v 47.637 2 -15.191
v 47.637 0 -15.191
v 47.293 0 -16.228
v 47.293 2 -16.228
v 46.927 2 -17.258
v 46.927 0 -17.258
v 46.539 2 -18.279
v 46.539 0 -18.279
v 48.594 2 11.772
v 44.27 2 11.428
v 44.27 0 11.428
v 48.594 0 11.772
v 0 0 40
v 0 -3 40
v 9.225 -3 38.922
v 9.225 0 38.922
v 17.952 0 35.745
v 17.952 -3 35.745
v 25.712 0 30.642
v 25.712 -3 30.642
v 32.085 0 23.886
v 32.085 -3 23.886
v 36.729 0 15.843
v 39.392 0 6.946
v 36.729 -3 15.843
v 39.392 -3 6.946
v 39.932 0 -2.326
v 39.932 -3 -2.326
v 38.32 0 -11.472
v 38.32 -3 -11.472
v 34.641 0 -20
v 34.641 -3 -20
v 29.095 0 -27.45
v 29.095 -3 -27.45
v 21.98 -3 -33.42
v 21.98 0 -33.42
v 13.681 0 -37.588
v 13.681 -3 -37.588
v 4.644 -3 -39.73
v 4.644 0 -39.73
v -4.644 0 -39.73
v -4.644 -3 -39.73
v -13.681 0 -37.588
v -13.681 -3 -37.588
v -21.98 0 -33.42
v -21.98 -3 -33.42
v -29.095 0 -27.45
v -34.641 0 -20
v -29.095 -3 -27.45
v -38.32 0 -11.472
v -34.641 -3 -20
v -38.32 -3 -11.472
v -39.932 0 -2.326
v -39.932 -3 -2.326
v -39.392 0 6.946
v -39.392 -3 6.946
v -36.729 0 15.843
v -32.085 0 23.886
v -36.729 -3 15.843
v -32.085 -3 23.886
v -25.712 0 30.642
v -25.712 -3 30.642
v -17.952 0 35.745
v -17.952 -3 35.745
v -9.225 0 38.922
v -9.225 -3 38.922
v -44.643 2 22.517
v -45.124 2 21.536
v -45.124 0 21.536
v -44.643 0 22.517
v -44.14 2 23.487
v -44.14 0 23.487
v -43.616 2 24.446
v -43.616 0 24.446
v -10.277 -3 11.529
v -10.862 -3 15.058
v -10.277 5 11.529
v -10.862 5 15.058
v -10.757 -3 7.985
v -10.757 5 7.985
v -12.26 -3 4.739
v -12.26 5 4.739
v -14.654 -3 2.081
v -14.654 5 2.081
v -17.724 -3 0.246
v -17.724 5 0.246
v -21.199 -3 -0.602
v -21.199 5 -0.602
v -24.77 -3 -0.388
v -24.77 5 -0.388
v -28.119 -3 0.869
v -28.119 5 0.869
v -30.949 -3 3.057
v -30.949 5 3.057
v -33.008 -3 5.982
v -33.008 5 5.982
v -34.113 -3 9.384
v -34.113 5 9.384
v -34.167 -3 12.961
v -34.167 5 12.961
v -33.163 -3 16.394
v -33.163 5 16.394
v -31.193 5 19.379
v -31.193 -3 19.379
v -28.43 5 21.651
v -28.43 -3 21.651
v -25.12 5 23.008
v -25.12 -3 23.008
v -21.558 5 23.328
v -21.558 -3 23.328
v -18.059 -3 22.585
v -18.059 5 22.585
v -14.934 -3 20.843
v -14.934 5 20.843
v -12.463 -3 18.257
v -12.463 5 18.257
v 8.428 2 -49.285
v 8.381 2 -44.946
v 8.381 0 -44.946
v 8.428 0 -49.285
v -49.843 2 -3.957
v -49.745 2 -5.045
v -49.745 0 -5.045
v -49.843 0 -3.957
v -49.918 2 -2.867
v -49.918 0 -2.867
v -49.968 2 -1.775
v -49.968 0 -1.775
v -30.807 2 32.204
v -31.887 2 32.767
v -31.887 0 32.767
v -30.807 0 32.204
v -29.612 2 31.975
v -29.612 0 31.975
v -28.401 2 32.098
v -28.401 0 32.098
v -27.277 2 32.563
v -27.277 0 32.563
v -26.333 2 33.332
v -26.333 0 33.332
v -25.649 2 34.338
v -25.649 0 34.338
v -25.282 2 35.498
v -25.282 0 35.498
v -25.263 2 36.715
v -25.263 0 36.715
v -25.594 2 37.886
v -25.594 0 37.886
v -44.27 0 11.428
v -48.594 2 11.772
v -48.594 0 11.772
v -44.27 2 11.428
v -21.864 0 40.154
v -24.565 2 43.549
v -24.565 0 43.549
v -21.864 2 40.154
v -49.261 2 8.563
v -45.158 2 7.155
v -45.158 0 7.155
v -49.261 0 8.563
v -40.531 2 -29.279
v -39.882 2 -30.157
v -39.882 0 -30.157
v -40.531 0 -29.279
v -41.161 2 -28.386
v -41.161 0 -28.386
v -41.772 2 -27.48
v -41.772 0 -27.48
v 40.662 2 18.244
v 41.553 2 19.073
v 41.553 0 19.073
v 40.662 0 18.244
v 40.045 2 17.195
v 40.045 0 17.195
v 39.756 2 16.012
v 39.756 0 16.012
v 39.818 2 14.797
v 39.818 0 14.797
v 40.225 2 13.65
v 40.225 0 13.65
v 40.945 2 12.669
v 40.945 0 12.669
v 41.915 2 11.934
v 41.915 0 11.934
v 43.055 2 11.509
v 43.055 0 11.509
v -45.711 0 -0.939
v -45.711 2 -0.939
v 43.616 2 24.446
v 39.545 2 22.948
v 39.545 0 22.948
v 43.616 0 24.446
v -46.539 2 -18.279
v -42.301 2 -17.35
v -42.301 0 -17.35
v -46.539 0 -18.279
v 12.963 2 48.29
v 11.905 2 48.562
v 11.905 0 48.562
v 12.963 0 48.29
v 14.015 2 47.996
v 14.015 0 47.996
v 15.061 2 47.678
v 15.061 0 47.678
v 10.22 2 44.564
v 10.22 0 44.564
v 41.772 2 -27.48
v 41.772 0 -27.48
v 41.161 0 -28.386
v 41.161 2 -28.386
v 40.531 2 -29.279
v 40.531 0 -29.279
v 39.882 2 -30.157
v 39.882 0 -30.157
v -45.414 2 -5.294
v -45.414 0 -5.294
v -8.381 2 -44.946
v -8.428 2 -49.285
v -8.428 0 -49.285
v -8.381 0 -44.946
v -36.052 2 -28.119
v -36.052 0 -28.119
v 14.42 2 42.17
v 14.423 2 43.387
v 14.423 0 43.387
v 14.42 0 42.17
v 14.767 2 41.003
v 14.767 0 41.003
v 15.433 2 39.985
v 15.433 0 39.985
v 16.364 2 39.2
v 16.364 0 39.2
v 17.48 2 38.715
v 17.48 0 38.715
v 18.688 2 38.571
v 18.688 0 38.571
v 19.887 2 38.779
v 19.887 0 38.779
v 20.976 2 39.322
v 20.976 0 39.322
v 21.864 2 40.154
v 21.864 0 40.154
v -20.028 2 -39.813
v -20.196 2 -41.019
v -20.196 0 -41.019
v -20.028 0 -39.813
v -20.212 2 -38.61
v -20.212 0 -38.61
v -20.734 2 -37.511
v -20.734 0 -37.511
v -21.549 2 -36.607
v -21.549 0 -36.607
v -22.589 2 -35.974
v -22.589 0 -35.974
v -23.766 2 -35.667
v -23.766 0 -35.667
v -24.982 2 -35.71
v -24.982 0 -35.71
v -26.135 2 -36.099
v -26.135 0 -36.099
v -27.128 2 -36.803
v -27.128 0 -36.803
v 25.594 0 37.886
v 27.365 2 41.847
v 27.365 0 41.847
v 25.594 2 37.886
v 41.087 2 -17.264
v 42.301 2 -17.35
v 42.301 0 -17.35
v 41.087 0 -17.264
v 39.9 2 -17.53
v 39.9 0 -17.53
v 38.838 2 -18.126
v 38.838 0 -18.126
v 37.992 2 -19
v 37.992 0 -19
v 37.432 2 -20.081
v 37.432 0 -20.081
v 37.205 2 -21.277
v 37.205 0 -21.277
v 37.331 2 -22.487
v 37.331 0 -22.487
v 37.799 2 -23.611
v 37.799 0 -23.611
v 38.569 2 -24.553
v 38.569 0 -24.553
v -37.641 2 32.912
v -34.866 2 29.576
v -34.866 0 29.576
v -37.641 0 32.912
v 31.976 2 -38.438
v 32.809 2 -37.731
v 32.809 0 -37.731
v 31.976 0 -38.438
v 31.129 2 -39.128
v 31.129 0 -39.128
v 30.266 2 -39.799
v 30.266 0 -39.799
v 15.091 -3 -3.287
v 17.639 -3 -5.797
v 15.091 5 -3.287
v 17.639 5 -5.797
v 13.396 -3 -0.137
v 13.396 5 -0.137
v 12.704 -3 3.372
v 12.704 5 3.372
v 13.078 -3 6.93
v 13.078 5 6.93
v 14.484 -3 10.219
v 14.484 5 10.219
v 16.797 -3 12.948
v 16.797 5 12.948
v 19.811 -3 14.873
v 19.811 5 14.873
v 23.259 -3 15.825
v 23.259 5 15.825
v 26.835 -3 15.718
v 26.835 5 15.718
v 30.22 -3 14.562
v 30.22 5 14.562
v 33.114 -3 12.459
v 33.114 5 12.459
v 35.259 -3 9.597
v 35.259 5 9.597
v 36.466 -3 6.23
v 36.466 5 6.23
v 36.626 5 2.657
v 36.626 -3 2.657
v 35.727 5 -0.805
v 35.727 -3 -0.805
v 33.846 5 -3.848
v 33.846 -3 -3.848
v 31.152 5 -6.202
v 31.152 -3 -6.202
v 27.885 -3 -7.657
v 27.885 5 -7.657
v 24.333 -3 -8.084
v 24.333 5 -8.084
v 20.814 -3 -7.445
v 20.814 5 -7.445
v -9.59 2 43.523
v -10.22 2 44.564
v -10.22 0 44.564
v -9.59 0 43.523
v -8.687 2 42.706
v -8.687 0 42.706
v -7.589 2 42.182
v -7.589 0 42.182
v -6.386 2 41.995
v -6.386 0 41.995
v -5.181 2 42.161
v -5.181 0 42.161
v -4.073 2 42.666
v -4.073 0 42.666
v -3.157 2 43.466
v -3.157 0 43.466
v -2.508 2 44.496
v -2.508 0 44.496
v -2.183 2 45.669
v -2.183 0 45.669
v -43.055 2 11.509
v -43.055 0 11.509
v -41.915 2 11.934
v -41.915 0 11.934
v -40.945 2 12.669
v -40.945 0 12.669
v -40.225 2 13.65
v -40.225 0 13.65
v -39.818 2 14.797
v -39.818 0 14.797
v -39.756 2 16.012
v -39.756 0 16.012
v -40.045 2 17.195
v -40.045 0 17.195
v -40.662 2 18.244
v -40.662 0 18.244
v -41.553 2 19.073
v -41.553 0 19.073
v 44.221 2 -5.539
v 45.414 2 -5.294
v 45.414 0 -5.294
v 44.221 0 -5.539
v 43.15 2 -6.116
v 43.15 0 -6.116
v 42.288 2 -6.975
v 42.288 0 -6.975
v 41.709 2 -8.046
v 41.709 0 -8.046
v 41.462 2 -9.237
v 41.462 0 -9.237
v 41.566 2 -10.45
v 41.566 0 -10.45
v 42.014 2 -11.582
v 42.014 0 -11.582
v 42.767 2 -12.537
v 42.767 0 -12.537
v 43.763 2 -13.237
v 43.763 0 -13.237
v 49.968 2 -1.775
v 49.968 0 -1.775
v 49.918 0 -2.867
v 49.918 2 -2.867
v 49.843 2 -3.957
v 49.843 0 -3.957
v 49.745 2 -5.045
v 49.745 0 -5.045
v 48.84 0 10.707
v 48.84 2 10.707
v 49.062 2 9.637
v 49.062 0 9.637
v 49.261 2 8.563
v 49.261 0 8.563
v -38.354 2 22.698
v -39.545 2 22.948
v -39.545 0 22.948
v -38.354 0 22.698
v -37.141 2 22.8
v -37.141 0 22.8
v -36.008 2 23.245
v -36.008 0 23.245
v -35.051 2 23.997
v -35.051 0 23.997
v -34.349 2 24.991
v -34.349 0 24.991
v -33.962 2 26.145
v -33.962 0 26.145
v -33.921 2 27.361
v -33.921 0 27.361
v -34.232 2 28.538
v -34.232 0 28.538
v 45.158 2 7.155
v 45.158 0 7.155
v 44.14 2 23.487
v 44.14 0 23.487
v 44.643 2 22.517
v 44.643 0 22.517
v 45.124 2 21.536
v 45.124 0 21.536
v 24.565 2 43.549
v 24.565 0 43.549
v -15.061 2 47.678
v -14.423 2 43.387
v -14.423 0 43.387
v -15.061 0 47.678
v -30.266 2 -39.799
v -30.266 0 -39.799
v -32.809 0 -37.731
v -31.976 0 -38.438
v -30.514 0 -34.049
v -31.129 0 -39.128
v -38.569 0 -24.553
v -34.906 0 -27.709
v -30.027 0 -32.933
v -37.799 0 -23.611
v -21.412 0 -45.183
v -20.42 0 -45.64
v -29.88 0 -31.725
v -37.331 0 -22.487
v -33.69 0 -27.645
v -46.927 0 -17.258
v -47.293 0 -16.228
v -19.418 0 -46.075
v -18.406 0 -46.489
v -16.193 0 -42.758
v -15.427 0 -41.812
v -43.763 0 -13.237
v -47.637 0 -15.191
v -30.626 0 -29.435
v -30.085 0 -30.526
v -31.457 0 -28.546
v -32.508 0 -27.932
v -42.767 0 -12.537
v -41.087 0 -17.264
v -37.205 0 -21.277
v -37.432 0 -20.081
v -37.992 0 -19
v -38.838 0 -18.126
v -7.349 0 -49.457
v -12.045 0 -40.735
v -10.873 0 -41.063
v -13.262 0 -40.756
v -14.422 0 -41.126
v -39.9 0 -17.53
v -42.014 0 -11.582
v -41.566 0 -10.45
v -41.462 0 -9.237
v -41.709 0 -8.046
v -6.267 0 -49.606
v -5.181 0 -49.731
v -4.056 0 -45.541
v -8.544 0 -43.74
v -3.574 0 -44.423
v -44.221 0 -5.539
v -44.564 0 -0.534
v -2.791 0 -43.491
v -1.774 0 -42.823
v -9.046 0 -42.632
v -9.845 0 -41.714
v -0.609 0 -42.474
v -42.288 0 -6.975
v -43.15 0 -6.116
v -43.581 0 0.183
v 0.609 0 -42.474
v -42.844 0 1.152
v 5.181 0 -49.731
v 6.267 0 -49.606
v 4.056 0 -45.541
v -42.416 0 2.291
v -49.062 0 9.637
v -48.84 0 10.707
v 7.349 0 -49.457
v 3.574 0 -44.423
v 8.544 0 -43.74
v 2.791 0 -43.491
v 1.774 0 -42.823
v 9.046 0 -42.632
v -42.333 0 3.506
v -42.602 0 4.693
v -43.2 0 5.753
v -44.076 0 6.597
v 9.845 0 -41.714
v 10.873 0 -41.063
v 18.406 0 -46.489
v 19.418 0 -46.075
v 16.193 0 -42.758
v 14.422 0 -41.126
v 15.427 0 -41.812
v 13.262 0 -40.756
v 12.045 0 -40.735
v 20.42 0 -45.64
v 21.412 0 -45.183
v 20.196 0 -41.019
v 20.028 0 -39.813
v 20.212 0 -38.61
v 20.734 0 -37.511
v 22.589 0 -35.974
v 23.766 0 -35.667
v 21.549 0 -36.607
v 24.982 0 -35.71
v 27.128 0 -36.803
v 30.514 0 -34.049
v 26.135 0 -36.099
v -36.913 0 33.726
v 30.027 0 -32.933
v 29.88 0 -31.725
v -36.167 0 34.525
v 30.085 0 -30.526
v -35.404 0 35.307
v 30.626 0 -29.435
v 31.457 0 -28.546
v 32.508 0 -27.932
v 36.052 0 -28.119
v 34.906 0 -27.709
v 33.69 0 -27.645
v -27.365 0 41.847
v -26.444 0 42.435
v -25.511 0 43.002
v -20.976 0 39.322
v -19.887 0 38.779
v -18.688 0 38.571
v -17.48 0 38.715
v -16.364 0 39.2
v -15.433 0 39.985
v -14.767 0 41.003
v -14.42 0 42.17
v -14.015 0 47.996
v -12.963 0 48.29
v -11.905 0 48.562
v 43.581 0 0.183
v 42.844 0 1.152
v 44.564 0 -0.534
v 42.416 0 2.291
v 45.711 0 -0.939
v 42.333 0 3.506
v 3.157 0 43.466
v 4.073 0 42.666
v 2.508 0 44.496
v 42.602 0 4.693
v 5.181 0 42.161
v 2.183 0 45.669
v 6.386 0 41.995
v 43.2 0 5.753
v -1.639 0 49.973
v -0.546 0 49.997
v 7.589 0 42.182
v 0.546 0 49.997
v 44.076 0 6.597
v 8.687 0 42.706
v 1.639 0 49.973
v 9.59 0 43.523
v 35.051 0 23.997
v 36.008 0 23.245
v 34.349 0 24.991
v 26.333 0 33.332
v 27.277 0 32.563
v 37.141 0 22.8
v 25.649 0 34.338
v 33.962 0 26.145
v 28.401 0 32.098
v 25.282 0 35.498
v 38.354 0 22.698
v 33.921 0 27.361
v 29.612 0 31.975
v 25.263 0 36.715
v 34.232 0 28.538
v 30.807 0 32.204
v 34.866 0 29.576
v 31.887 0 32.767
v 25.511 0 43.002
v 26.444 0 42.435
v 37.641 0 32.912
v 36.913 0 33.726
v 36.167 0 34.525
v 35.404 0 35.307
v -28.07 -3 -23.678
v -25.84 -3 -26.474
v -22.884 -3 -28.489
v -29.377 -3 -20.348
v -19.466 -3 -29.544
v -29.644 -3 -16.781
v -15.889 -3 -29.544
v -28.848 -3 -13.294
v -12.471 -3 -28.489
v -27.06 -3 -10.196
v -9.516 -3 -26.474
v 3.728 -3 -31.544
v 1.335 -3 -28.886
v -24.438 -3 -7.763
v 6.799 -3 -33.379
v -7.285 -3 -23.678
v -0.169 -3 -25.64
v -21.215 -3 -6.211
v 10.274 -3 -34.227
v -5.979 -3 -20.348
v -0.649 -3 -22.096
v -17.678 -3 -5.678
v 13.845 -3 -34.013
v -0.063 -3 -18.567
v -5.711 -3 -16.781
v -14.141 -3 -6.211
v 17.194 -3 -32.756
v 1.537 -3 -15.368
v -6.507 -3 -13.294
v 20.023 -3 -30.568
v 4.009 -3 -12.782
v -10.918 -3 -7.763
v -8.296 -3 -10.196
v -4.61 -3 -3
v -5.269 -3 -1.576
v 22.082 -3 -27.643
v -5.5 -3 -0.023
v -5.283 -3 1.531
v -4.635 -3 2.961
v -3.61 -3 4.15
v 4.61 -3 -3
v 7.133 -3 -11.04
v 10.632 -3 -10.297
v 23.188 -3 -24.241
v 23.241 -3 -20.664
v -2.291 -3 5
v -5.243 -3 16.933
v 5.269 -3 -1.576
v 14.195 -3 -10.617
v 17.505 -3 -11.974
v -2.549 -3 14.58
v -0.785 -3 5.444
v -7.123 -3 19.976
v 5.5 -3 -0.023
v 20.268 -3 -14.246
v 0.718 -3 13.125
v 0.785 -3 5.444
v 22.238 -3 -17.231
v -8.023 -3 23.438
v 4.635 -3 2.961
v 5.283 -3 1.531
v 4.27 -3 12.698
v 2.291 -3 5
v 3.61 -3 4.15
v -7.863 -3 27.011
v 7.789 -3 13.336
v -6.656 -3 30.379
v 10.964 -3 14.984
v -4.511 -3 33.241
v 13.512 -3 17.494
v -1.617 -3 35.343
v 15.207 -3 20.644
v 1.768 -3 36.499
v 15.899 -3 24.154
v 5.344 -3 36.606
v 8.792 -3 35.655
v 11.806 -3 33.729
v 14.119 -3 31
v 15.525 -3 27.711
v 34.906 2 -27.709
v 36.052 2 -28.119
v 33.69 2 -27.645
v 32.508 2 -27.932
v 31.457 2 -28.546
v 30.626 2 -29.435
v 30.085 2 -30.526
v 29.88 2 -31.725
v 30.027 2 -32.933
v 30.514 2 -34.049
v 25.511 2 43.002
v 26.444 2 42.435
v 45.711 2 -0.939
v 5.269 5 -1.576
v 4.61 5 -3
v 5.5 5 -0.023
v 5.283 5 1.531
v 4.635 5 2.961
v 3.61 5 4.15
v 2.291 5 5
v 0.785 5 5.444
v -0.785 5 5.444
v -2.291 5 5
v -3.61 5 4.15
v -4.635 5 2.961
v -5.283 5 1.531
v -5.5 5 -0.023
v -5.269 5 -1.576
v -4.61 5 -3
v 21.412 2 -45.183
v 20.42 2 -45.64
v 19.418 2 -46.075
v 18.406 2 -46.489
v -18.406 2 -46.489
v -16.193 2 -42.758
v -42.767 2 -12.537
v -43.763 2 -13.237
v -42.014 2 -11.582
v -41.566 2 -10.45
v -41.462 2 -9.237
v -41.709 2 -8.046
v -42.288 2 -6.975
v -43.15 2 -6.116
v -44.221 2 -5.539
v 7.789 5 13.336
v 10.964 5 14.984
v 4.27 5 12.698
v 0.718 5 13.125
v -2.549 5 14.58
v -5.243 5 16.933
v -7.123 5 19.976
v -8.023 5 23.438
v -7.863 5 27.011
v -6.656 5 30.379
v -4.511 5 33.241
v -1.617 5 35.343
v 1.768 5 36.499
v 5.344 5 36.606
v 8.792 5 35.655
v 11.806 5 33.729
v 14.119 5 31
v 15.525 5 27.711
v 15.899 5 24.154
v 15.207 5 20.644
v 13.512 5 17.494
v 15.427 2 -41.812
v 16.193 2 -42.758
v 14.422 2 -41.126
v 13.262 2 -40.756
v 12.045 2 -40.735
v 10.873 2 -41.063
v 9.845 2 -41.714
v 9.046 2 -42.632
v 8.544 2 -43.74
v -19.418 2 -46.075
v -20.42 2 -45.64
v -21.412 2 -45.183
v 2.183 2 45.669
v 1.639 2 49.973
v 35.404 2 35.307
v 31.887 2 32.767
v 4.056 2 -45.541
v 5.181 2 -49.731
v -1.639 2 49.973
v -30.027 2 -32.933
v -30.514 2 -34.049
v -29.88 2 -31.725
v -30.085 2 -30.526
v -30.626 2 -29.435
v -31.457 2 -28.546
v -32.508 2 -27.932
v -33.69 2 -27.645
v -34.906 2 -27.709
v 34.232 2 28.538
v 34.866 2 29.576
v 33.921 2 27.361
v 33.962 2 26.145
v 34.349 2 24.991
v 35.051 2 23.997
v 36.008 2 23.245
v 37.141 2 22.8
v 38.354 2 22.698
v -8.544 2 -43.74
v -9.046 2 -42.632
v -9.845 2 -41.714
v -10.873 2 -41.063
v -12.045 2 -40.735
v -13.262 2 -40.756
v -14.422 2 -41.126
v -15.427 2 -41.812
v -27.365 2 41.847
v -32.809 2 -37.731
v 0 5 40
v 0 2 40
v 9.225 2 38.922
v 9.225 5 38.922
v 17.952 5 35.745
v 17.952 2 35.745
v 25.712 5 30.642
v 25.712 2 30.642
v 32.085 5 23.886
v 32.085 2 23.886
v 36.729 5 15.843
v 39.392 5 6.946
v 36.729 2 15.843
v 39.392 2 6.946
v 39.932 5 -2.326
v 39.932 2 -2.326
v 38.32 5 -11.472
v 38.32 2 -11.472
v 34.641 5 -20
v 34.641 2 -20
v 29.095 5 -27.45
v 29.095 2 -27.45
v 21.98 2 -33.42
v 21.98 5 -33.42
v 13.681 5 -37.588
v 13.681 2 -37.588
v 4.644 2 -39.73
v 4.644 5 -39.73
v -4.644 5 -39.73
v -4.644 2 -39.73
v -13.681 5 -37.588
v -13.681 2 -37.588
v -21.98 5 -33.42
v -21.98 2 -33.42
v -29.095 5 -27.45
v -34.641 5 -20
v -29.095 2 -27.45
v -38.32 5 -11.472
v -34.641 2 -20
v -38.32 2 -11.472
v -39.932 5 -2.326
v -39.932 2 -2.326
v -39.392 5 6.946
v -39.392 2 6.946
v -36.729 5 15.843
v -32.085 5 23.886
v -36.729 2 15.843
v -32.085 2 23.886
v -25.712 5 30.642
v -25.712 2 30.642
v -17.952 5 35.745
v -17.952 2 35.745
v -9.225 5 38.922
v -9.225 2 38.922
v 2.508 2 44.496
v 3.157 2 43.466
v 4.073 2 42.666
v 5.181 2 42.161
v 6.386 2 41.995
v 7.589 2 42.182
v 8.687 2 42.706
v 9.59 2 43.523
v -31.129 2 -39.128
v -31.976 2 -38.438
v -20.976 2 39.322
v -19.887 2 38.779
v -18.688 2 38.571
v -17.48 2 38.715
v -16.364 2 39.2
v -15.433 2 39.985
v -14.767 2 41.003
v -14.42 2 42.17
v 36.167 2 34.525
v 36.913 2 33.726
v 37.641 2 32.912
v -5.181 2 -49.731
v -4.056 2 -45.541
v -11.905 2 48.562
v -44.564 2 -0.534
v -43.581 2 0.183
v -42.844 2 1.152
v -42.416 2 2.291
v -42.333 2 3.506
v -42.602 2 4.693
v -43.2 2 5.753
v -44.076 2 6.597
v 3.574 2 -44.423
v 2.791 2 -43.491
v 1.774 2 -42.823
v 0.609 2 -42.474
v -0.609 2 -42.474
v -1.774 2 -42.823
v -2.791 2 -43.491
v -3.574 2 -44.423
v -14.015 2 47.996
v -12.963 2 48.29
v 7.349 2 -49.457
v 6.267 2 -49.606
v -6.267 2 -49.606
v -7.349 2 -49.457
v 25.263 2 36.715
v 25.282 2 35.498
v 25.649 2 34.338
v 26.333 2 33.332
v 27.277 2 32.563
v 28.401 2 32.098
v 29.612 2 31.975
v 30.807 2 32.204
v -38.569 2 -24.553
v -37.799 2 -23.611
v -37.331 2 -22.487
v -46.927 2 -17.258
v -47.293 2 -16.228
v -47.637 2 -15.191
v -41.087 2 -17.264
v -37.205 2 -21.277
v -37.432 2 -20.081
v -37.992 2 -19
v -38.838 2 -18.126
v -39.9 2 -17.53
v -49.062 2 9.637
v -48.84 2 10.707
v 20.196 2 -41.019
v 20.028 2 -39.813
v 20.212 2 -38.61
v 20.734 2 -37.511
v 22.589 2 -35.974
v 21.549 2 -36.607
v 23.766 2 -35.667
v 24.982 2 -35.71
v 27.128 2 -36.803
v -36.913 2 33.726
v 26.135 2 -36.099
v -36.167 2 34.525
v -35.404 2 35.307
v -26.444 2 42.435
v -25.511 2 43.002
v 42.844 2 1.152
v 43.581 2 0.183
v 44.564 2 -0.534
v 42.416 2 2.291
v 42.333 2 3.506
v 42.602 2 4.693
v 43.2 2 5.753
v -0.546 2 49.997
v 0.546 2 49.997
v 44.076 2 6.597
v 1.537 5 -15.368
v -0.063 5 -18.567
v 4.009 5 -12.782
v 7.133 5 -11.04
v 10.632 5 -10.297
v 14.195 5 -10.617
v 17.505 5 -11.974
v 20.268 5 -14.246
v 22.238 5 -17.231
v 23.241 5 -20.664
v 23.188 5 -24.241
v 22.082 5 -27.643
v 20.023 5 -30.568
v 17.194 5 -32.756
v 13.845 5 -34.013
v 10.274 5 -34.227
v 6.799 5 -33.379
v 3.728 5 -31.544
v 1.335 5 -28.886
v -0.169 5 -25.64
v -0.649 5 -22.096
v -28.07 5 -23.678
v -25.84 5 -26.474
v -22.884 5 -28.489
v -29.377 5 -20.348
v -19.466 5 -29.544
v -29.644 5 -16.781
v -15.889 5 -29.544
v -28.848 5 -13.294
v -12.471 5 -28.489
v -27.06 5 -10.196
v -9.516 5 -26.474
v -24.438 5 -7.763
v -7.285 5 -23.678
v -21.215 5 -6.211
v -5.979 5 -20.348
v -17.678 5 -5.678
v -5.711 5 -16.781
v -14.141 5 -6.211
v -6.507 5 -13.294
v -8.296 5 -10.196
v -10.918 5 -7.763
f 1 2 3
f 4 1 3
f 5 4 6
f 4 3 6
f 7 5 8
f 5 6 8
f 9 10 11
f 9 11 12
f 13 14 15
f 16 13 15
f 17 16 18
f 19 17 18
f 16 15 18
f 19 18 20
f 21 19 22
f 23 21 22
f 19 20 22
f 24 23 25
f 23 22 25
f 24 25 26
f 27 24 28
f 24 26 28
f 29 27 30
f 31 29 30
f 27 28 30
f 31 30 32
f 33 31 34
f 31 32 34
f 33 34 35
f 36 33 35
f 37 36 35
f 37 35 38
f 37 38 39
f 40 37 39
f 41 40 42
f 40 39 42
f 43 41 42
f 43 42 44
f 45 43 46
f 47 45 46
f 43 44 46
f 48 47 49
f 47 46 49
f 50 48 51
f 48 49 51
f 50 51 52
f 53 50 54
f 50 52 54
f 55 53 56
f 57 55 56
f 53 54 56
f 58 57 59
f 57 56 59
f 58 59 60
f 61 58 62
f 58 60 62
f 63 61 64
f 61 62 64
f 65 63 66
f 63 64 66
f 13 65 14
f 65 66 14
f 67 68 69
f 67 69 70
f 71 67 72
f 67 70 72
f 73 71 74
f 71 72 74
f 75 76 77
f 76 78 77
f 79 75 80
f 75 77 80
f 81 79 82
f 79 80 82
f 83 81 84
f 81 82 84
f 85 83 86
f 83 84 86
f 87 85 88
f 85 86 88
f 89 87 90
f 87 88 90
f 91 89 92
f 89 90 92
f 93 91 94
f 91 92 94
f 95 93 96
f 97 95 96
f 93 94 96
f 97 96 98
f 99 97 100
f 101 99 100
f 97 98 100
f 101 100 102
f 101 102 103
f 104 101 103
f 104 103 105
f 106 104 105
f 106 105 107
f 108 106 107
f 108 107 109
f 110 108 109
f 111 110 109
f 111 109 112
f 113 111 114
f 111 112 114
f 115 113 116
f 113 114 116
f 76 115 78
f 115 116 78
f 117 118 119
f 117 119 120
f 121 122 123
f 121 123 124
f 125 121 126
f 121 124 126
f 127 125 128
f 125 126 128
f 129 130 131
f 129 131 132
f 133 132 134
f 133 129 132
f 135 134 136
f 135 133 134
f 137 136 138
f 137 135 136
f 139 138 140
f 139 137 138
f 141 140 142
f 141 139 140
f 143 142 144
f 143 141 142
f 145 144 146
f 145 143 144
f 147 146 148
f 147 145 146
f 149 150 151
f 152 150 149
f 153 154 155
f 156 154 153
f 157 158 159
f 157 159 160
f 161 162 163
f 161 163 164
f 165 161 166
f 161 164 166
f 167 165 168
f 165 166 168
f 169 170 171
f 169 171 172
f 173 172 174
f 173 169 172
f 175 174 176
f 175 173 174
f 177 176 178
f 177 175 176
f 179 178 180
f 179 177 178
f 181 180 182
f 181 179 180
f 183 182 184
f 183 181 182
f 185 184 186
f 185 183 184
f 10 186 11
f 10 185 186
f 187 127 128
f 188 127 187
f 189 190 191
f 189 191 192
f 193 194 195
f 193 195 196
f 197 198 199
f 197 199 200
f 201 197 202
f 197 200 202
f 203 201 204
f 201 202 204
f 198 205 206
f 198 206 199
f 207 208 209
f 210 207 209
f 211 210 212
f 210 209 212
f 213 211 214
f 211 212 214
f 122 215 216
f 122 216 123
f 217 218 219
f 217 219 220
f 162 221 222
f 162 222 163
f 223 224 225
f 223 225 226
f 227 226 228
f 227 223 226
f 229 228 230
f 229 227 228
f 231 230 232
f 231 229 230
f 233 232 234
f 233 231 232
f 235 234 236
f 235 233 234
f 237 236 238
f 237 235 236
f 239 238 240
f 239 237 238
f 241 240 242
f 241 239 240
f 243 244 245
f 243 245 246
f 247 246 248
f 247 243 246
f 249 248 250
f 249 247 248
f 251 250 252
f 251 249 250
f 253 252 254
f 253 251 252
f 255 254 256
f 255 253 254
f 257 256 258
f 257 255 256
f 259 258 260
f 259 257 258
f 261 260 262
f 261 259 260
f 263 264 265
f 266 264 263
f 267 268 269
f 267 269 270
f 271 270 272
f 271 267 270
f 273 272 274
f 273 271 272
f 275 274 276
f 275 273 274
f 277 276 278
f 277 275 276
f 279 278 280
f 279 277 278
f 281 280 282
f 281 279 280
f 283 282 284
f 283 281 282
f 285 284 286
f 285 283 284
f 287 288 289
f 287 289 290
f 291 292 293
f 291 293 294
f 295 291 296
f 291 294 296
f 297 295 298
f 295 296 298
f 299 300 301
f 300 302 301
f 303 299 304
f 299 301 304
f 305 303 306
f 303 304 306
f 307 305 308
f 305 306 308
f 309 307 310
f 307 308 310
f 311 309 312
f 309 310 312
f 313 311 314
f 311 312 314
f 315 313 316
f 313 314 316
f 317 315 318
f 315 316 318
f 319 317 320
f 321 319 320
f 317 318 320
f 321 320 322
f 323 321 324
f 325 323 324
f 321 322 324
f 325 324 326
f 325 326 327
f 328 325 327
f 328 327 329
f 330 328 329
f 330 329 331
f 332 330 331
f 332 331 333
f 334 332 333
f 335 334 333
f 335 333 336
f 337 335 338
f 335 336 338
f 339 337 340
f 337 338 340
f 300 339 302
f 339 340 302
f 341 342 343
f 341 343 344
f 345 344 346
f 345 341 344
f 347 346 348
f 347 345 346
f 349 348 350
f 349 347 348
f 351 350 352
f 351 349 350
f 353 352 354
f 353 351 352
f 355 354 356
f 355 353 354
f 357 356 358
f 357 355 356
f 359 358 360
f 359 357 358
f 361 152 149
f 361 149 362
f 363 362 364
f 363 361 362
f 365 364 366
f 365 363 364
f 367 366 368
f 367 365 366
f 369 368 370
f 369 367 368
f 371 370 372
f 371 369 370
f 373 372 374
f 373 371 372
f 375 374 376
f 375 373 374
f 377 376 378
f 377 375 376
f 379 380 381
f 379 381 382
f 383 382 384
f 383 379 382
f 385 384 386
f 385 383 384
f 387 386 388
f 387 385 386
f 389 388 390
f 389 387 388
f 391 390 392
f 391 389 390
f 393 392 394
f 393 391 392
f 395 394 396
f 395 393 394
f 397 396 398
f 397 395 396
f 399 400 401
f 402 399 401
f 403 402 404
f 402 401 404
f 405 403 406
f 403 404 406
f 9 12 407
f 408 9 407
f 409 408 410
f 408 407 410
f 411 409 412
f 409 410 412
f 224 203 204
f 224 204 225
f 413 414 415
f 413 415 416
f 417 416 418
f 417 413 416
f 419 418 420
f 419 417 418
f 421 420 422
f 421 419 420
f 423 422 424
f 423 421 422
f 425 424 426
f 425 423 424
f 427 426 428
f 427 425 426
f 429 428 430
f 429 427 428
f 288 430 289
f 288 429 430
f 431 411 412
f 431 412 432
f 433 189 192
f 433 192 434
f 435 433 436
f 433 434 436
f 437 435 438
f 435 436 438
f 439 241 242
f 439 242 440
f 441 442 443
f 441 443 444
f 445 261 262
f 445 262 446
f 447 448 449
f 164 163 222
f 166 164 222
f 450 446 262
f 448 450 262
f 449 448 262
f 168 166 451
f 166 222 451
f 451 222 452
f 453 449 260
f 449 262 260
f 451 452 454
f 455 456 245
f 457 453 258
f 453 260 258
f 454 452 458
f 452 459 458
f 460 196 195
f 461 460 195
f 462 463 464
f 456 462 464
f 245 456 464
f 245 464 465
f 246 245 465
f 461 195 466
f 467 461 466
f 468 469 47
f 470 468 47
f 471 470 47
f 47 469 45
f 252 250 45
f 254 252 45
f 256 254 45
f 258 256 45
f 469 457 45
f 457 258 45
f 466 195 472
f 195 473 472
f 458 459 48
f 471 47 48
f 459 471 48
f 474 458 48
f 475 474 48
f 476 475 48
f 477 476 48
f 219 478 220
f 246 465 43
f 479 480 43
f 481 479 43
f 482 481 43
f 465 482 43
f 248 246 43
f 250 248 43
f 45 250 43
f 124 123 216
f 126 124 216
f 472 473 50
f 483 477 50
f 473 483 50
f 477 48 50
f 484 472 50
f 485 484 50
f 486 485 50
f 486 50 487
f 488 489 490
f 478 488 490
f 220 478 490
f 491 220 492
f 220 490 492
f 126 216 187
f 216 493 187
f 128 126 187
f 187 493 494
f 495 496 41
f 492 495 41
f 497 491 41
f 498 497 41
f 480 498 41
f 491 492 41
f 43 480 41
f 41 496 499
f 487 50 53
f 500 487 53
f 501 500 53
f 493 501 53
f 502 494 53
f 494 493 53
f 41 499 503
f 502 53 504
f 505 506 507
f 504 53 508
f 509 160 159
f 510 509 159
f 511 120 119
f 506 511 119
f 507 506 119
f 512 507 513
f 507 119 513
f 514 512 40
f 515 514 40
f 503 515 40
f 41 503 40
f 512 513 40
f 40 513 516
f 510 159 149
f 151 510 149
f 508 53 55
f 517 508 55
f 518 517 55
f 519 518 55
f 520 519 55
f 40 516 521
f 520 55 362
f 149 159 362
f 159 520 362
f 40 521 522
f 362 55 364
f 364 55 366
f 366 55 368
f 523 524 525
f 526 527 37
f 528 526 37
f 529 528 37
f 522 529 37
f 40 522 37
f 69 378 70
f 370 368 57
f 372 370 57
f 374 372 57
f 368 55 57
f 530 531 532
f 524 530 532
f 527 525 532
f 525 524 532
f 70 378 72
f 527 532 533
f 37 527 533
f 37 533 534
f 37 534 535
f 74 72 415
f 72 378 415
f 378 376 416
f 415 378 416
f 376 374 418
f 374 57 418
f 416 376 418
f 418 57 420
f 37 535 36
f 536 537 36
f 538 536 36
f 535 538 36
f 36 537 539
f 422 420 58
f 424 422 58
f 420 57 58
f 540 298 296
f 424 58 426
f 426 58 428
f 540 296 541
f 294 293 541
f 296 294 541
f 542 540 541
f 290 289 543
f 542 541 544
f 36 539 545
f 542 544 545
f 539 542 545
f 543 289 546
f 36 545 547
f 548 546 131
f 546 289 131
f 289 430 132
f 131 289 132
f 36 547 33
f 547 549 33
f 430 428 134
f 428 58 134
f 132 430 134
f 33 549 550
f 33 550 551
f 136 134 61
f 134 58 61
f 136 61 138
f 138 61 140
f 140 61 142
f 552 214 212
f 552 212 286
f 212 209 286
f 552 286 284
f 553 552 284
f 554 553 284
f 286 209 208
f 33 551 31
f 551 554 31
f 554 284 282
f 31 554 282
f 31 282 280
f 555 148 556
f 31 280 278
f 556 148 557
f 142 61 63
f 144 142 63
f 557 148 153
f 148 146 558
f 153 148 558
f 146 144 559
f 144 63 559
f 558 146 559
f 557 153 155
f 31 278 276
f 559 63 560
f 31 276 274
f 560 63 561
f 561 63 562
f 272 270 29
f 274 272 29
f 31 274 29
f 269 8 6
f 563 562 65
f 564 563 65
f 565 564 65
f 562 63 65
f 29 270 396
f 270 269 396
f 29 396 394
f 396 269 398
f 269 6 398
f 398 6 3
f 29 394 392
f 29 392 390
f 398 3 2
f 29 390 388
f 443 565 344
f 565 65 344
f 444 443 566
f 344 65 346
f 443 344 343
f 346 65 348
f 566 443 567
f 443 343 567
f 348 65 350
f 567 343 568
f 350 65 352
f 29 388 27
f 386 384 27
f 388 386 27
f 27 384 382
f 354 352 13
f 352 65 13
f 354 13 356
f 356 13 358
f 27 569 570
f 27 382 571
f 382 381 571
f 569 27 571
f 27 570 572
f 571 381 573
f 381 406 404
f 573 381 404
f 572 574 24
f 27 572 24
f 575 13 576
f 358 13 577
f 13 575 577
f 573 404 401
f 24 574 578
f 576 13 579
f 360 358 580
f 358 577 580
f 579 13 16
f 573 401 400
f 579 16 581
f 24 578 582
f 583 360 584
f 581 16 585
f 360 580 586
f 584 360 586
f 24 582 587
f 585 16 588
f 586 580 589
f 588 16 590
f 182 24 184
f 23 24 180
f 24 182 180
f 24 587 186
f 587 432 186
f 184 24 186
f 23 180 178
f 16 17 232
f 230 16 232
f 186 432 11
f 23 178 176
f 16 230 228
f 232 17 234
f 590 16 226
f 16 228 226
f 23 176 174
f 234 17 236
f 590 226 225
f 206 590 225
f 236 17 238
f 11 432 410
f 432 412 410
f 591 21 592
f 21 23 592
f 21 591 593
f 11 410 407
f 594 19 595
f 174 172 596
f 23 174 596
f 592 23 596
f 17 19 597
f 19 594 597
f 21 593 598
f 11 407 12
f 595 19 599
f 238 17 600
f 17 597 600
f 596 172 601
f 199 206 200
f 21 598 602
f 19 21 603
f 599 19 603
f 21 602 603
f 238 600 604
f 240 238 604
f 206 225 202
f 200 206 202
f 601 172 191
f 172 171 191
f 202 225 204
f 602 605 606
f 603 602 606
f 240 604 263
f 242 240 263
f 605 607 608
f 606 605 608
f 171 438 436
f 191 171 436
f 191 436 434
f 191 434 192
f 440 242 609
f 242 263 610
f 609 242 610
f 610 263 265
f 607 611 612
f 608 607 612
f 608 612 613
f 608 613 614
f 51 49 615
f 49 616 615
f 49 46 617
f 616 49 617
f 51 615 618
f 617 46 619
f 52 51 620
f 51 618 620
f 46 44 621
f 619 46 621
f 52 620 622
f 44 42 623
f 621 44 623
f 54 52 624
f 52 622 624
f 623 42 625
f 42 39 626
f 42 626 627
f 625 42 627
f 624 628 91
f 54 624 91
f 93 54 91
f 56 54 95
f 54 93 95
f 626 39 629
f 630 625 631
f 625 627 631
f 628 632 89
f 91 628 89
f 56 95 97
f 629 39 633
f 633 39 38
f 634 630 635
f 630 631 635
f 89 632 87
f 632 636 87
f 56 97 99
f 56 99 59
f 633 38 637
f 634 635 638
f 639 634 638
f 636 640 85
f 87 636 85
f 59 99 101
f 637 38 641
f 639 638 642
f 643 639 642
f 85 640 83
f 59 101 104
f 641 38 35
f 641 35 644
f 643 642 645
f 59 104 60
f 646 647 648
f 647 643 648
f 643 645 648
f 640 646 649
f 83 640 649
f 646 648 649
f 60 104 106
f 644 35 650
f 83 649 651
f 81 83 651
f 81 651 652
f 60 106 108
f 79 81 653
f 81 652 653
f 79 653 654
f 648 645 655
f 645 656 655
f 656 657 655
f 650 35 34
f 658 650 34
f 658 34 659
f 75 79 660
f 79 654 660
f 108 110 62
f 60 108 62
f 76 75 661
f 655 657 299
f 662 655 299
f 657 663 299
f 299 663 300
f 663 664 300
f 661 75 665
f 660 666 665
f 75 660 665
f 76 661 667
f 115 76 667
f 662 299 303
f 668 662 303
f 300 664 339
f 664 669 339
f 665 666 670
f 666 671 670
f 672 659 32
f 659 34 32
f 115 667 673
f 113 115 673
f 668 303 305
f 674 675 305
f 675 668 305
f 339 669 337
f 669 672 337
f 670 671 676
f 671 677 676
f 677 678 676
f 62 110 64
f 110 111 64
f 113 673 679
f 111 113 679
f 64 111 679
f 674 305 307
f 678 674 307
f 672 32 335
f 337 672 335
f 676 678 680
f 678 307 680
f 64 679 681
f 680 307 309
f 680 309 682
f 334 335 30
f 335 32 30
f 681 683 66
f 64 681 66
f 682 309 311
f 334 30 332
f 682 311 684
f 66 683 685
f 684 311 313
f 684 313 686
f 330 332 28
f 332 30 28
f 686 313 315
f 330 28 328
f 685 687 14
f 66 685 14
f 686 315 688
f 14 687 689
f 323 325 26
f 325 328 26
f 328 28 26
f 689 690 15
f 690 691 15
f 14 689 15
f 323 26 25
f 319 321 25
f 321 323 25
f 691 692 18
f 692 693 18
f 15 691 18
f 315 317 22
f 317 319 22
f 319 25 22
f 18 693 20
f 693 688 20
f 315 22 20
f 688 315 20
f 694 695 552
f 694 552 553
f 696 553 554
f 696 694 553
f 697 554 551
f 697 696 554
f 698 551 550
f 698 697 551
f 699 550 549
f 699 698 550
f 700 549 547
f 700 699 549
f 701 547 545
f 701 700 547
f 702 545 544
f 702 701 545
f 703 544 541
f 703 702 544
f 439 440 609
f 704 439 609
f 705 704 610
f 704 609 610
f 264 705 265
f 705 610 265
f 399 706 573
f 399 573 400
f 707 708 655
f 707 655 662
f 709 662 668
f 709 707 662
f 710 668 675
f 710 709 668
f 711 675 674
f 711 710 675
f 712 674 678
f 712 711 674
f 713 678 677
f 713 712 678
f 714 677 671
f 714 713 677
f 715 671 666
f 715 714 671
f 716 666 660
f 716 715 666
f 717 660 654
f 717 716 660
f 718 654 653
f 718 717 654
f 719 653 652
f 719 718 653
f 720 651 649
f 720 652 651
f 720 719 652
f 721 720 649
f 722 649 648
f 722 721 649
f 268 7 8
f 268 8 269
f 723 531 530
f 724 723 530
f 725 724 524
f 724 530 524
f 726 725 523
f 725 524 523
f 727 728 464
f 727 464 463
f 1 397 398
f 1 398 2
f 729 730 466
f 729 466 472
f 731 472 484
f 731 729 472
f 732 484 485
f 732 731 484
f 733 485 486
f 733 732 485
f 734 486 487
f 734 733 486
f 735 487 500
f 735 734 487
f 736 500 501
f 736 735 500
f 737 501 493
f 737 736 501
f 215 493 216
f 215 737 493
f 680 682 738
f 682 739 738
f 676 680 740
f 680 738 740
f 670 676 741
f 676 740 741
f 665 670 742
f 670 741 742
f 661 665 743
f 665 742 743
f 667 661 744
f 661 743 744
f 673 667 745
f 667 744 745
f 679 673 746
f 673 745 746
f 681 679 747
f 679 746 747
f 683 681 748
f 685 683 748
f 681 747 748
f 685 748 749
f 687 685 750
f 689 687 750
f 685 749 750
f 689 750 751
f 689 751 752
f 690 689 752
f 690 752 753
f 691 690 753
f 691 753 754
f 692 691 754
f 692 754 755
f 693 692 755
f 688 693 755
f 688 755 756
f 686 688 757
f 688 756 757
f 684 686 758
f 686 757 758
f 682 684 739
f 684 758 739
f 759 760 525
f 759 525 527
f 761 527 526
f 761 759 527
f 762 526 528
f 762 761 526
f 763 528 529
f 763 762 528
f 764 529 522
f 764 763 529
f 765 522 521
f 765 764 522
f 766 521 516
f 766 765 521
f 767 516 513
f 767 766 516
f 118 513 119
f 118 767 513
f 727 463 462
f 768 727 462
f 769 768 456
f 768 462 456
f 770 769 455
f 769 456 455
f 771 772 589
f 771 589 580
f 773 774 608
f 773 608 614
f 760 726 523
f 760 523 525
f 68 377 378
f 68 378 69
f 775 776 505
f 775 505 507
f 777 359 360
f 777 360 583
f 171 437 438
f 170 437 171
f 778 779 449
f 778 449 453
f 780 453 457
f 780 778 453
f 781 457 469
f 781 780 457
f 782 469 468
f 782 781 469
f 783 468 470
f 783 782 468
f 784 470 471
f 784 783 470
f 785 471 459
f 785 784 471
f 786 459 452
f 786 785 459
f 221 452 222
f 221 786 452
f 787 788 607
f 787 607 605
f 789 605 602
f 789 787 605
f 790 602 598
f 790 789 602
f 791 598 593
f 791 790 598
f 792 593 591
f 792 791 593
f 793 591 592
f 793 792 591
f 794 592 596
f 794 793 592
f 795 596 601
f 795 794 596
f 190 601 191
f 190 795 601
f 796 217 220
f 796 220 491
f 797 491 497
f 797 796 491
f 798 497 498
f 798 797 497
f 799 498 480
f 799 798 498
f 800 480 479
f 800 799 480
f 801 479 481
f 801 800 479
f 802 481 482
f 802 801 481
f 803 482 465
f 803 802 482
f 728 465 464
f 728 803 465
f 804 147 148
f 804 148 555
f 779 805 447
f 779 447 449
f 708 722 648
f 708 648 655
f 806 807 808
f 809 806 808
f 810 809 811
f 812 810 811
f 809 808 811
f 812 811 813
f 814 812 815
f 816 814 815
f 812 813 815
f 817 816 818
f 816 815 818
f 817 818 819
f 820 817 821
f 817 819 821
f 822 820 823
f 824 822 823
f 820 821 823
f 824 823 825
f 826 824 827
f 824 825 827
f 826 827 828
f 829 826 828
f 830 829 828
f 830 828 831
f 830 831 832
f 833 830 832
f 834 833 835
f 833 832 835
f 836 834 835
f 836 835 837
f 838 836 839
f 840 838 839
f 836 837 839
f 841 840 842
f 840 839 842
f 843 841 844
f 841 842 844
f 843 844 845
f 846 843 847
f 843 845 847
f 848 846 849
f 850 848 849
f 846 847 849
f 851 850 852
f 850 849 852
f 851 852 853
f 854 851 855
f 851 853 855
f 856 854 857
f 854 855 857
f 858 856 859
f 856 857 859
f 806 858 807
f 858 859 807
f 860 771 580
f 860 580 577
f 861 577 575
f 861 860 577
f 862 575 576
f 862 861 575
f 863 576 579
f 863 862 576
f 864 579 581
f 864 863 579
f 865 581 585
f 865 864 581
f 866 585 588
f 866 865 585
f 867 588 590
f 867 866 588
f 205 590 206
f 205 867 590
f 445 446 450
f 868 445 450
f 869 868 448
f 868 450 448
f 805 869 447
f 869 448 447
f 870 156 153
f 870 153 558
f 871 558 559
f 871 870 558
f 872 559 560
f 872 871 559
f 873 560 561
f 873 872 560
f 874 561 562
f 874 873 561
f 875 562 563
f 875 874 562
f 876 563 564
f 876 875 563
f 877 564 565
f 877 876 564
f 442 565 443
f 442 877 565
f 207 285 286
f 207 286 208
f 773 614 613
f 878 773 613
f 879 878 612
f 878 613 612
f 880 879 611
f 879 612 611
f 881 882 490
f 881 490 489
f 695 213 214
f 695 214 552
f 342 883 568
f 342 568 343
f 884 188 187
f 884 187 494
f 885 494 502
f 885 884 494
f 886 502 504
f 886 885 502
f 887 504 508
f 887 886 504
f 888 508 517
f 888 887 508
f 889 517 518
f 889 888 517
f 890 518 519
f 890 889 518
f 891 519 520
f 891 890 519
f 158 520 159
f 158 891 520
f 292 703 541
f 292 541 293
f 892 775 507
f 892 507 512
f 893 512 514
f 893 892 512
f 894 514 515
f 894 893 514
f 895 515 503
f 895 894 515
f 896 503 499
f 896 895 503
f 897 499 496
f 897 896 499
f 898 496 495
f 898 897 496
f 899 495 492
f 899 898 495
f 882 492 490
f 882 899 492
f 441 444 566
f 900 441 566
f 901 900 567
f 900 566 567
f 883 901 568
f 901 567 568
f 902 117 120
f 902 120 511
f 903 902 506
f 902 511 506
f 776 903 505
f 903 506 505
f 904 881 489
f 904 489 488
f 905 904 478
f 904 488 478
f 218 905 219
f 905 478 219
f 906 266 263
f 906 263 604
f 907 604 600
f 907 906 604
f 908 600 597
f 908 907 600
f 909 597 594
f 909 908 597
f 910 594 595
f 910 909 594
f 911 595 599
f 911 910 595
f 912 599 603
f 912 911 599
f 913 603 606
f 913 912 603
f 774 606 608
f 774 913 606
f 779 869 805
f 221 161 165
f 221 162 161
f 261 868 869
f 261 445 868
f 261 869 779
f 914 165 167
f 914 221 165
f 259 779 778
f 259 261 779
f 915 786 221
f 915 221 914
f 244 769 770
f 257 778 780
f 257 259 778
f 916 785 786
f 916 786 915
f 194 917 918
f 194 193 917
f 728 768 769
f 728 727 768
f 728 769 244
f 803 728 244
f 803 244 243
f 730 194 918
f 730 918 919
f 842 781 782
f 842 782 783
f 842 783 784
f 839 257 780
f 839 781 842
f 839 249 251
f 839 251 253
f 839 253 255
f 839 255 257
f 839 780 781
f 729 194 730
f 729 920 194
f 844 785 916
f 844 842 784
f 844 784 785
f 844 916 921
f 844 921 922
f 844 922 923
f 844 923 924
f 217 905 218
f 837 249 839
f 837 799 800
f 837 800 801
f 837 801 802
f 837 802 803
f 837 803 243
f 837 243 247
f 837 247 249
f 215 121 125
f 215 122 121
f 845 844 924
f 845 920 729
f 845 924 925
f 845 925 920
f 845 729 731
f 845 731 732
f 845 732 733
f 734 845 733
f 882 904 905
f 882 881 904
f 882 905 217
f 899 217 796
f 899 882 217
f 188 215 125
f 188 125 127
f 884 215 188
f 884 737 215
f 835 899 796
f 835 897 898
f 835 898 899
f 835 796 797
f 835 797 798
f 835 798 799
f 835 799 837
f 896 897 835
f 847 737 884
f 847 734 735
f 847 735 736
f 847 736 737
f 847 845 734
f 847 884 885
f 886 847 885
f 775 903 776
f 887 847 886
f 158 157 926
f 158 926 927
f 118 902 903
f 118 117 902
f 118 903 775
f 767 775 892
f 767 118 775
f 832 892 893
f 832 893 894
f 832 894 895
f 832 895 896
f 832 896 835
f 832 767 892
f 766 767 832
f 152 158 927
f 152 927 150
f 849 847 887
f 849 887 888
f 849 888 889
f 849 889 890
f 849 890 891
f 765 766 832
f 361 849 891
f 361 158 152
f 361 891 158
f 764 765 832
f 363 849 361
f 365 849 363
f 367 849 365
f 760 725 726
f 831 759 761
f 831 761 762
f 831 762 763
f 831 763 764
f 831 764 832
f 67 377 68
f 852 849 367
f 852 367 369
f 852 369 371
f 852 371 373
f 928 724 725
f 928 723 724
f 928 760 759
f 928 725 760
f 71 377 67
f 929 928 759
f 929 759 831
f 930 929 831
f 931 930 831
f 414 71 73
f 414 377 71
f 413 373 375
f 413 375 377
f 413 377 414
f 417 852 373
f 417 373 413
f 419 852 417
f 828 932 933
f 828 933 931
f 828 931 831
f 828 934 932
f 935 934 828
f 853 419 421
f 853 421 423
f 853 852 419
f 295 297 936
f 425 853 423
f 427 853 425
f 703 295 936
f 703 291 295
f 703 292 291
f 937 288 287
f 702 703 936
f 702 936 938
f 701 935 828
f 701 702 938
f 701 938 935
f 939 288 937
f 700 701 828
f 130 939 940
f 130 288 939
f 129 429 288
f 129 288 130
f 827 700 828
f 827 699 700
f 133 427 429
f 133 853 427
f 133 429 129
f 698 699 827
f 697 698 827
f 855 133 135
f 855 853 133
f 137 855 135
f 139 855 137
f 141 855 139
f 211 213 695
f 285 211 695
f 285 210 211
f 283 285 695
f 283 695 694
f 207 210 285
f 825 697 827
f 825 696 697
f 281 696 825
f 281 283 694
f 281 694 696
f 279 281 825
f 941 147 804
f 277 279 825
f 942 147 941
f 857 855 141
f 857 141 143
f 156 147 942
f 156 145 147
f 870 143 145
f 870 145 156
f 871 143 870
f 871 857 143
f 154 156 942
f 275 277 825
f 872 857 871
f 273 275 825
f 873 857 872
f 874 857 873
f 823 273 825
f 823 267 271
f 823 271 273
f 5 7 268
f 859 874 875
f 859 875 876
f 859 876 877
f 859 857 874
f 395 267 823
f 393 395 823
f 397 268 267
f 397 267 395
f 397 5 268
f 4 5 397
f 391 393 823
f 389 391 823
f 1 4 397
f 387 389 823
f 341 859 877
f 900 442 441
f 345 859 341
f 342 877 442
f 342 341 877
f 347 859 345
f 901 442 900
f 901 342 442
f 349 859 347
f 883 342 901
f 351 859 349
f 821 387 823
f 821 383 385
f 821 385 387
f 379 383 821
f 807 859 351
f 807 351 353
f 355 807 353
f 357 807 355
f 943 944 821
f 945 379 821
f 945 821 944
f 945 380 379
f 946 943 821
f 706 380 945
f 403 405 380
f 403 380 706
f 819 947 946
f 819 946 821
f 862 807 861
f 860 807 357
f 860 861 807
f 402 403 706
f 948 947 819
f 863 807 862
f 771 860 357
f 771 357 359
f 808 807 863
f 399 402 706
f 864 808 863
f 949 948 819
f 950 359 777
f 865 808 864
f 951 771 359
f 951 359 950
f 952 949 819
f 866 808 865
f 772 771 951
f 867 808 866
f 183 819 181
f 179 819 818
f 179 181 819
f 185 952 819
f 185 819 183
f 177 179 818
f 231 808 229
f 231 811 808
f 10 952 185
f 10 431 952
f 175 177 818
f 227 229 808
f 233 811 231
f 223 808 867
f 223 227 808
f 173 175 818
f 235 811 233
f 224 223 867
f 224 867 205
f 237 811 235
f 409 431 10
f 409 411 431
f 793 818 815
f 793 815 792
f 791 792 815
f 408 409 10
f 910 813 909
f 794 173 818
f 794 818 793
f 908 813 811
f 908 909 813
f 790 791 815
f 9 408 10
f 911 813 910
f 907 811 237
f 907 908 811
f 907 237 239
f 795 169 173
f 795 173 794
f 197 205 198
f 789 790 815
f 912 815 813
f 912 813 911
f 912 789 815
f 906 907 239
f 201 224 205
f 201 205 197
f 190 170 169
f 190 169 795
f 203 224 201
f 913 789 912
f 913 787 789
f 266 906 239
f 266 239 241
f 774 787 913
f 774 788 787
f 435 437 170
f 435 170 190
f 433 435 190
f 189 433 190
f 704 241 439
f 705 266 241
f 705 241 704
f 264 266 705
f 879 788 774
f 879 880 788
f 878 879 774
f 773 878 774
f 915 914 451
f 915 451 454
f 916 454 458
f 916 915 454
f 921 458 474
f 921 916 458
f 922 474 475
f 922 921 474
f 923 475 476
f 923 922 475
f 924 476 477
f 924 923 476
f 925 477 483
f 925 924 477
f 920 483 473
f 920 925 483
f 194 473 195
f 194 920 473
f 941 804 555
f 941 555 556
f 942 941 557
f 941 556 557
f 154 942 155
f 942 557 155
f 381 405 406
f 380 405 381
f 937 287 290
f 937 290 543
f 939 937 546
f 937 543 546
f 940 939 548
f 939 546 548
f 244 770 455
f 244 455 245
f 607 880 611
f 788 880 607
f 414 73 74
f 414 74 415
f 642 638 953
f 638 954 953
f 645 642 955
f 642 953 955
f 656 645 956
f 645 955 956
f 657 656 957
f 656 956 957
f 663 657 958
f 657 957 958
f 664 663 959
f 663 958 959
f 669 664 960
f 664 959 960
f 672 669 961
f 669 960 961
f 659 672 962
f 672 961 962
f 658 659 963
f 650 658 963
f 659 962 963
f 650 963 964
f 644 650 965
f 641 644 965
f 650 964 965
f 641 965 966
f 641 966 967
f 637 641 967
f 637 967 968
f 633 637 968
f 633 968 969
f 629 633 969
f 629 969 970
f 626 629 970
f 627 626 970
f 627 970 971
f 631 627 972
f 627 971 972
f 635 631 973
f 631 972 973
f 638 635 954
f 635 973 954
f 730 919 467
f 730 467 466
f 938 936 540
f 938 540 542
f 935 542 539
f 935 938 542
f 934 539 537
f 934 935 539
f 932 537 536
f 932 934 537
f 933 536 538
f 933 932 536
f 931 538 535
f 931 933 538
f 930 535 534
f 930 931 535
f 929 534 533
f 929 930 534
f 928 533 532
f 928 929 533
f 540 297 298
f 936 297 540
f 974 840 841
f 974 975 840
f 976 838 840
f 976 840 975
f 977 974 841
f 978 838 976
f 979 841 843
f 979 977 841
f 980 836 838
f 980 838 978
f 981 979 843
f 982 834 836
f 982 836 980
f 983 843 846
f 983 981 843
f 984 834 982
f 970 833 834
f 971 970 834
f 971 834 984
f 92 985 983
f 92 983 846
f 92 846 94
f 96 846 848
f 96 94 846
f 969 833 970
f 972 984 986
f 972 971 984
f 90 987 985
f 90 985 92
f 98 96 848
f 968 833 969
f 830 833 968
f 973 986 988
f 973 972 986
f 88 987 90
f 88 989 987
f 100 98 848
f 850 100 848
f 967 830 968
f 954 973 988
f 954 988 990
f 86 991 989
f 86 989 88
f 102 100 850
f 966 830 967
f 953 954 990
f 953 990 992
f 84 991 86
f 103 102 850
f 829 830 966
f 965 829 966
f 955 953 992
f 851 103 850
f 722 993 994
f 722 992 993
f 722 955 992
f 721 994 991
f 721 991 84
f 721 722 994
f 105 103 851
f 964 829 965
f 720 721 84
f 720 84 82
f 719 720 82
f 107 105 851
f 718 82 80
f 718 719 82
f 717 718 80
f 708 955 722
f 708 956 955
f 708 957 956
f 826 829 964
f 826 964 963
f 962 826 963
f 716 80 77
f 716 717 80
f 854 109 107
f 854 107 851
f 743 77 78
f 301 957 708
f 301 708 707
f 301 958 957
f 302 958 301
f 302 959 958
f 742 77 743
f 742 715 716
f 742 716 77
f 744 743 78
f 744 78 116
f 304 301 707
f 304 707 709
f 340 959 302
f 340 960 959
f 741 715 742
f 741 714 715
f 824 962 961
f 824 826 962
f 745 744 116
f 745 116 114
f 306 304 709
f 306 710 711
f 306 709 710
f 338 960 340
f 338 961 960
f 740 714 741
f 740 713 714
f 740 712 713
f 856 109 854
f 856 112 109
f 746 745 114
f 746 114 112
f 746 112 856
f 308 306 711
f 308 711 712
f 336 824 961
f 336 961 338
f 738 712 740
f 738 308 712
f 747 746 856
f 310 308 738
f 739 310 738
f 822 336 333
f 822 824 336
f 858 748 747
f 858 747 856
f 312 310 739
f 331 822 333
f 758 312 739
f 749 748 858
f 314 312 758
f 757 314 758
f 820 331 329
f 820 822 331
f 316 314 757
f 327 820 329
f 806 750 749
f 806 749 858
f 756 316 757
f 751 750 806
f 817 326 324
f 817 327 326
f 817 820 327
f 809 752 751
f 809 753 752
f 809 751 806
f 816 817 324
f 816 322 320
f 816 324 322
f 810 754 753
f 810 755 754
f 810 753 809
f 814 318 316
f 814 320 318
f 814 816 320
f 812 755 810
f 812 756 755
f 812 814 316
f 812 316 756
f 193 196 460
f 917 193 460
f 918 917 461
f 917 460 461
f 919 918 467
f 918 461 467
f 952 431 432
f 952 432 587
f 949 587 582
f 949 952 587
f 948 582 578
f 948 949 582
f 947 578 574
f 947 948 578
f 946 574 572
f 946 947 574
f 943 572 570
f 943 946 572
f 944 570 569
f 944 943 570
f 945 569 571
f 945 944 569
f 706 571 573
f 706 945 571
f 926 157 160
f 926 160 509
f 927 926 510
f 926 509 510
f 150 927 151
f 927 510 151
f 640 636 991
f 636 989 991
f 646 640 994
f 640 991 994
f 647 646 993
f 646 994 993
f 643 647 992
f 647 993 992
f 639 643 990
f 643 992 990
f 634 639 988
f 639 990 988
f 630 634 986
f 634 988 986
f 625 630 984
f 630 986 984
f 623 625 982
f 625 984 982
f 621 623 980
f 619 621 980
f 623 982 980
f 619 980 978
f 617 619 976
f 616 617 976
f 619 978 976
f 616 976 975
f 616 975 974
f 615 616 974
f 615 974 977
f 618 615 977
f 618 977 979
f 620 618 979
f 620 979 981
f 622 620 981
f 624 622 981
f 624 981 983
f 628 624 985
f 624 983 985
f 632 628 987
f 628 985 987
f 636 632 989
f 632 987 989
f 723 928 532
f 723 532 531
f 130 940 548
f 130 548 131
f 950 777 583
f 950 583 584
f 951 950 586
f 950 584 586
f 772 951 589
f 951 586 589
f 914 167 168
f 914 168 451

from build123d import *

# Parameters (mm, degrees)
IZIM1_R                     = 50
Y_KSEKLIK_EKSTR_ZYON1_DEPTH = 2
KES_EKSTR_ZYON2_DEPTH       = 2
DAIRESEL_KAPLAMA2_COUNT     = 23
IZIM12_R                    = 40
Y_KSEKLIK_EKSTR_ZYON2_DEPTH = 3
Y_KSEKLIK_EKSTR_ZYON3_START = -3
IZIM13_R                    = 40
Y_KSEKLIK_EKSTR_ZYON3_DEPTH = 3
IZIM14_R                    = 12
KES_EKSTR_ZYON6_DEPTH       = 7
DAIRESEL_KAPLAMA5_COUNT     = 5
KES_EKSTR_ZYON7_DEPTH       = 7


with BuildPart() as part:
    # Çizim1 → Yükseklik-Ekstrüzyon1 (new body)
    with BuildSketch(Plane(origin=(0, 0, 0), x_dir=(1, 0, 0), z_dir=(0, 1, 0))):
        with Locations(Location((0, 0, 0), (0, 0, 270))):
            Circle(IZIM1_R)
    extrude(amount=Y_KSEKLIK_EKSTR_ZYON1_DEPTH)

    # Çizim2 → Kes-Ekstrüzyon2 (cut)
    with BuildSketch(Plane(origin=(0, 2, 0), x_dir=(1, 0, 0), z_dir=(0, 1, 0))):
        with BuildLine():
            Line((-7.668264722, 58.995898097), (5.736778926, 51.800614184))
            Line((5.736778926, 51.800614184), (4.056392608, 45.540740741))
            ThreePointArc((4.056392608, 45.540740741), (0, 42.42962963), (-4.056392608, 45.540740741))
            Line((-4.056392608, 45.540740741), (-7.668264722, 58.995898097))
        make_face()
    kes_ekstr_zyon2 = extrude(amount=-KES_EKSTR_ZYON2_DEPTH, mode=Mode.SUBTRACT)

    # Dairesel Kaplama2: Kes-Ekstrüzyon2 ×23 about axis
    dairesel_kaplama2_axis = Axis((0, 0, 0), (0, 1, 0))
    for i in range(1, DAIRESEL_KAPLAMA2_COUNT):
        add(kes_ekstr_zyon2.rotate(dairesel_kaplama2_axis, i * 360 / DAIRESEL_KAPLAMA2_COUNT), mode=Mode.SUBTRACT)

    # Çizim12 → Yükseklik-Ekstrüzyon2 (add)
    with BuildSketch(Plane(origin=(0, 2, 0), x_dir=(1, 0, 0), z_dir=(0, 1, 0))):
        with Locations(Location((0, 0, 0), (0, 0, 270))):
            Circle(IZIM12_R)
    extrude(amount=Y_KSEKLIK_EKSTR_ZYON2_DEPTH)

    # Çizim13 → Yükseklik-Ekstrüzyon3 (add)
    with BuildSketch(Plane(origin=(0, 0, 0), x_dir=(1, 0, 0), z_dir=(0, 1, 0)).offset(Y_KSEKLIK_EKSTR_ZYON3_START)):
        with Locations(Location((0, 0, 0), (0, 0, 270))):
            Circle(IZIM13_R)
    extrude(amount=Y_KSEKLIK_EKSTR_ZYON3_DEPTH)

    # Çizim14 → Kes-Ekstrüzyon6 (cut, symmetric)
    with BuildSketch(Plane(origin=(0, 2, 0), x_dir=(1, 0, 0), z_dir=(0, 1, 0))):
        with Locations(Location((-17.67766953, 17.67766953, 0), (0, 0, 270))):
            Circle(IZIM14_R)
    kes_ekstr_zyon6 = extrude(amount=KES_EKSTR_ZYON6_DEPTH, both=True, mode=Mode.SUBTRACT)

    # Dairesel Kaplama5: Kes-Ekstrüzyon6 ×5 about axis
    dairesel_kaplama5_axis = Axis((0, 0, 0), (0, 1, 0))
    for i in range(1, DAIRESEL_KAPLAMA5_COUNT):
        add(kes_ekstr_zyon6.rotate(dairesel_kaplama5_axis, i * 360 / DAIRESEL_KAPLAMA5_COUNT), mode=Mode.SUBTRACT)

    # Çizim16 → Kes-Ekstrüzyon7 (cut, symmetric)
    with BuildSketch(Plane(origin=(0, 2, 0), x_dir=(1, 0, 0), z_dir=(0, 1, 0))):
        with BuildLine():
            Line((-4.609772229, 3), (4.609772229, 3))
            ThreePointArc((4.609772229, 3), (0, -5.5), (-4.609772229, 3))
        make_face()
    extrude(amount=KES_EKSTR_ZYON7_DEPTH, both=True, mode=Mode.SUBTRACT)


solid = part.part
